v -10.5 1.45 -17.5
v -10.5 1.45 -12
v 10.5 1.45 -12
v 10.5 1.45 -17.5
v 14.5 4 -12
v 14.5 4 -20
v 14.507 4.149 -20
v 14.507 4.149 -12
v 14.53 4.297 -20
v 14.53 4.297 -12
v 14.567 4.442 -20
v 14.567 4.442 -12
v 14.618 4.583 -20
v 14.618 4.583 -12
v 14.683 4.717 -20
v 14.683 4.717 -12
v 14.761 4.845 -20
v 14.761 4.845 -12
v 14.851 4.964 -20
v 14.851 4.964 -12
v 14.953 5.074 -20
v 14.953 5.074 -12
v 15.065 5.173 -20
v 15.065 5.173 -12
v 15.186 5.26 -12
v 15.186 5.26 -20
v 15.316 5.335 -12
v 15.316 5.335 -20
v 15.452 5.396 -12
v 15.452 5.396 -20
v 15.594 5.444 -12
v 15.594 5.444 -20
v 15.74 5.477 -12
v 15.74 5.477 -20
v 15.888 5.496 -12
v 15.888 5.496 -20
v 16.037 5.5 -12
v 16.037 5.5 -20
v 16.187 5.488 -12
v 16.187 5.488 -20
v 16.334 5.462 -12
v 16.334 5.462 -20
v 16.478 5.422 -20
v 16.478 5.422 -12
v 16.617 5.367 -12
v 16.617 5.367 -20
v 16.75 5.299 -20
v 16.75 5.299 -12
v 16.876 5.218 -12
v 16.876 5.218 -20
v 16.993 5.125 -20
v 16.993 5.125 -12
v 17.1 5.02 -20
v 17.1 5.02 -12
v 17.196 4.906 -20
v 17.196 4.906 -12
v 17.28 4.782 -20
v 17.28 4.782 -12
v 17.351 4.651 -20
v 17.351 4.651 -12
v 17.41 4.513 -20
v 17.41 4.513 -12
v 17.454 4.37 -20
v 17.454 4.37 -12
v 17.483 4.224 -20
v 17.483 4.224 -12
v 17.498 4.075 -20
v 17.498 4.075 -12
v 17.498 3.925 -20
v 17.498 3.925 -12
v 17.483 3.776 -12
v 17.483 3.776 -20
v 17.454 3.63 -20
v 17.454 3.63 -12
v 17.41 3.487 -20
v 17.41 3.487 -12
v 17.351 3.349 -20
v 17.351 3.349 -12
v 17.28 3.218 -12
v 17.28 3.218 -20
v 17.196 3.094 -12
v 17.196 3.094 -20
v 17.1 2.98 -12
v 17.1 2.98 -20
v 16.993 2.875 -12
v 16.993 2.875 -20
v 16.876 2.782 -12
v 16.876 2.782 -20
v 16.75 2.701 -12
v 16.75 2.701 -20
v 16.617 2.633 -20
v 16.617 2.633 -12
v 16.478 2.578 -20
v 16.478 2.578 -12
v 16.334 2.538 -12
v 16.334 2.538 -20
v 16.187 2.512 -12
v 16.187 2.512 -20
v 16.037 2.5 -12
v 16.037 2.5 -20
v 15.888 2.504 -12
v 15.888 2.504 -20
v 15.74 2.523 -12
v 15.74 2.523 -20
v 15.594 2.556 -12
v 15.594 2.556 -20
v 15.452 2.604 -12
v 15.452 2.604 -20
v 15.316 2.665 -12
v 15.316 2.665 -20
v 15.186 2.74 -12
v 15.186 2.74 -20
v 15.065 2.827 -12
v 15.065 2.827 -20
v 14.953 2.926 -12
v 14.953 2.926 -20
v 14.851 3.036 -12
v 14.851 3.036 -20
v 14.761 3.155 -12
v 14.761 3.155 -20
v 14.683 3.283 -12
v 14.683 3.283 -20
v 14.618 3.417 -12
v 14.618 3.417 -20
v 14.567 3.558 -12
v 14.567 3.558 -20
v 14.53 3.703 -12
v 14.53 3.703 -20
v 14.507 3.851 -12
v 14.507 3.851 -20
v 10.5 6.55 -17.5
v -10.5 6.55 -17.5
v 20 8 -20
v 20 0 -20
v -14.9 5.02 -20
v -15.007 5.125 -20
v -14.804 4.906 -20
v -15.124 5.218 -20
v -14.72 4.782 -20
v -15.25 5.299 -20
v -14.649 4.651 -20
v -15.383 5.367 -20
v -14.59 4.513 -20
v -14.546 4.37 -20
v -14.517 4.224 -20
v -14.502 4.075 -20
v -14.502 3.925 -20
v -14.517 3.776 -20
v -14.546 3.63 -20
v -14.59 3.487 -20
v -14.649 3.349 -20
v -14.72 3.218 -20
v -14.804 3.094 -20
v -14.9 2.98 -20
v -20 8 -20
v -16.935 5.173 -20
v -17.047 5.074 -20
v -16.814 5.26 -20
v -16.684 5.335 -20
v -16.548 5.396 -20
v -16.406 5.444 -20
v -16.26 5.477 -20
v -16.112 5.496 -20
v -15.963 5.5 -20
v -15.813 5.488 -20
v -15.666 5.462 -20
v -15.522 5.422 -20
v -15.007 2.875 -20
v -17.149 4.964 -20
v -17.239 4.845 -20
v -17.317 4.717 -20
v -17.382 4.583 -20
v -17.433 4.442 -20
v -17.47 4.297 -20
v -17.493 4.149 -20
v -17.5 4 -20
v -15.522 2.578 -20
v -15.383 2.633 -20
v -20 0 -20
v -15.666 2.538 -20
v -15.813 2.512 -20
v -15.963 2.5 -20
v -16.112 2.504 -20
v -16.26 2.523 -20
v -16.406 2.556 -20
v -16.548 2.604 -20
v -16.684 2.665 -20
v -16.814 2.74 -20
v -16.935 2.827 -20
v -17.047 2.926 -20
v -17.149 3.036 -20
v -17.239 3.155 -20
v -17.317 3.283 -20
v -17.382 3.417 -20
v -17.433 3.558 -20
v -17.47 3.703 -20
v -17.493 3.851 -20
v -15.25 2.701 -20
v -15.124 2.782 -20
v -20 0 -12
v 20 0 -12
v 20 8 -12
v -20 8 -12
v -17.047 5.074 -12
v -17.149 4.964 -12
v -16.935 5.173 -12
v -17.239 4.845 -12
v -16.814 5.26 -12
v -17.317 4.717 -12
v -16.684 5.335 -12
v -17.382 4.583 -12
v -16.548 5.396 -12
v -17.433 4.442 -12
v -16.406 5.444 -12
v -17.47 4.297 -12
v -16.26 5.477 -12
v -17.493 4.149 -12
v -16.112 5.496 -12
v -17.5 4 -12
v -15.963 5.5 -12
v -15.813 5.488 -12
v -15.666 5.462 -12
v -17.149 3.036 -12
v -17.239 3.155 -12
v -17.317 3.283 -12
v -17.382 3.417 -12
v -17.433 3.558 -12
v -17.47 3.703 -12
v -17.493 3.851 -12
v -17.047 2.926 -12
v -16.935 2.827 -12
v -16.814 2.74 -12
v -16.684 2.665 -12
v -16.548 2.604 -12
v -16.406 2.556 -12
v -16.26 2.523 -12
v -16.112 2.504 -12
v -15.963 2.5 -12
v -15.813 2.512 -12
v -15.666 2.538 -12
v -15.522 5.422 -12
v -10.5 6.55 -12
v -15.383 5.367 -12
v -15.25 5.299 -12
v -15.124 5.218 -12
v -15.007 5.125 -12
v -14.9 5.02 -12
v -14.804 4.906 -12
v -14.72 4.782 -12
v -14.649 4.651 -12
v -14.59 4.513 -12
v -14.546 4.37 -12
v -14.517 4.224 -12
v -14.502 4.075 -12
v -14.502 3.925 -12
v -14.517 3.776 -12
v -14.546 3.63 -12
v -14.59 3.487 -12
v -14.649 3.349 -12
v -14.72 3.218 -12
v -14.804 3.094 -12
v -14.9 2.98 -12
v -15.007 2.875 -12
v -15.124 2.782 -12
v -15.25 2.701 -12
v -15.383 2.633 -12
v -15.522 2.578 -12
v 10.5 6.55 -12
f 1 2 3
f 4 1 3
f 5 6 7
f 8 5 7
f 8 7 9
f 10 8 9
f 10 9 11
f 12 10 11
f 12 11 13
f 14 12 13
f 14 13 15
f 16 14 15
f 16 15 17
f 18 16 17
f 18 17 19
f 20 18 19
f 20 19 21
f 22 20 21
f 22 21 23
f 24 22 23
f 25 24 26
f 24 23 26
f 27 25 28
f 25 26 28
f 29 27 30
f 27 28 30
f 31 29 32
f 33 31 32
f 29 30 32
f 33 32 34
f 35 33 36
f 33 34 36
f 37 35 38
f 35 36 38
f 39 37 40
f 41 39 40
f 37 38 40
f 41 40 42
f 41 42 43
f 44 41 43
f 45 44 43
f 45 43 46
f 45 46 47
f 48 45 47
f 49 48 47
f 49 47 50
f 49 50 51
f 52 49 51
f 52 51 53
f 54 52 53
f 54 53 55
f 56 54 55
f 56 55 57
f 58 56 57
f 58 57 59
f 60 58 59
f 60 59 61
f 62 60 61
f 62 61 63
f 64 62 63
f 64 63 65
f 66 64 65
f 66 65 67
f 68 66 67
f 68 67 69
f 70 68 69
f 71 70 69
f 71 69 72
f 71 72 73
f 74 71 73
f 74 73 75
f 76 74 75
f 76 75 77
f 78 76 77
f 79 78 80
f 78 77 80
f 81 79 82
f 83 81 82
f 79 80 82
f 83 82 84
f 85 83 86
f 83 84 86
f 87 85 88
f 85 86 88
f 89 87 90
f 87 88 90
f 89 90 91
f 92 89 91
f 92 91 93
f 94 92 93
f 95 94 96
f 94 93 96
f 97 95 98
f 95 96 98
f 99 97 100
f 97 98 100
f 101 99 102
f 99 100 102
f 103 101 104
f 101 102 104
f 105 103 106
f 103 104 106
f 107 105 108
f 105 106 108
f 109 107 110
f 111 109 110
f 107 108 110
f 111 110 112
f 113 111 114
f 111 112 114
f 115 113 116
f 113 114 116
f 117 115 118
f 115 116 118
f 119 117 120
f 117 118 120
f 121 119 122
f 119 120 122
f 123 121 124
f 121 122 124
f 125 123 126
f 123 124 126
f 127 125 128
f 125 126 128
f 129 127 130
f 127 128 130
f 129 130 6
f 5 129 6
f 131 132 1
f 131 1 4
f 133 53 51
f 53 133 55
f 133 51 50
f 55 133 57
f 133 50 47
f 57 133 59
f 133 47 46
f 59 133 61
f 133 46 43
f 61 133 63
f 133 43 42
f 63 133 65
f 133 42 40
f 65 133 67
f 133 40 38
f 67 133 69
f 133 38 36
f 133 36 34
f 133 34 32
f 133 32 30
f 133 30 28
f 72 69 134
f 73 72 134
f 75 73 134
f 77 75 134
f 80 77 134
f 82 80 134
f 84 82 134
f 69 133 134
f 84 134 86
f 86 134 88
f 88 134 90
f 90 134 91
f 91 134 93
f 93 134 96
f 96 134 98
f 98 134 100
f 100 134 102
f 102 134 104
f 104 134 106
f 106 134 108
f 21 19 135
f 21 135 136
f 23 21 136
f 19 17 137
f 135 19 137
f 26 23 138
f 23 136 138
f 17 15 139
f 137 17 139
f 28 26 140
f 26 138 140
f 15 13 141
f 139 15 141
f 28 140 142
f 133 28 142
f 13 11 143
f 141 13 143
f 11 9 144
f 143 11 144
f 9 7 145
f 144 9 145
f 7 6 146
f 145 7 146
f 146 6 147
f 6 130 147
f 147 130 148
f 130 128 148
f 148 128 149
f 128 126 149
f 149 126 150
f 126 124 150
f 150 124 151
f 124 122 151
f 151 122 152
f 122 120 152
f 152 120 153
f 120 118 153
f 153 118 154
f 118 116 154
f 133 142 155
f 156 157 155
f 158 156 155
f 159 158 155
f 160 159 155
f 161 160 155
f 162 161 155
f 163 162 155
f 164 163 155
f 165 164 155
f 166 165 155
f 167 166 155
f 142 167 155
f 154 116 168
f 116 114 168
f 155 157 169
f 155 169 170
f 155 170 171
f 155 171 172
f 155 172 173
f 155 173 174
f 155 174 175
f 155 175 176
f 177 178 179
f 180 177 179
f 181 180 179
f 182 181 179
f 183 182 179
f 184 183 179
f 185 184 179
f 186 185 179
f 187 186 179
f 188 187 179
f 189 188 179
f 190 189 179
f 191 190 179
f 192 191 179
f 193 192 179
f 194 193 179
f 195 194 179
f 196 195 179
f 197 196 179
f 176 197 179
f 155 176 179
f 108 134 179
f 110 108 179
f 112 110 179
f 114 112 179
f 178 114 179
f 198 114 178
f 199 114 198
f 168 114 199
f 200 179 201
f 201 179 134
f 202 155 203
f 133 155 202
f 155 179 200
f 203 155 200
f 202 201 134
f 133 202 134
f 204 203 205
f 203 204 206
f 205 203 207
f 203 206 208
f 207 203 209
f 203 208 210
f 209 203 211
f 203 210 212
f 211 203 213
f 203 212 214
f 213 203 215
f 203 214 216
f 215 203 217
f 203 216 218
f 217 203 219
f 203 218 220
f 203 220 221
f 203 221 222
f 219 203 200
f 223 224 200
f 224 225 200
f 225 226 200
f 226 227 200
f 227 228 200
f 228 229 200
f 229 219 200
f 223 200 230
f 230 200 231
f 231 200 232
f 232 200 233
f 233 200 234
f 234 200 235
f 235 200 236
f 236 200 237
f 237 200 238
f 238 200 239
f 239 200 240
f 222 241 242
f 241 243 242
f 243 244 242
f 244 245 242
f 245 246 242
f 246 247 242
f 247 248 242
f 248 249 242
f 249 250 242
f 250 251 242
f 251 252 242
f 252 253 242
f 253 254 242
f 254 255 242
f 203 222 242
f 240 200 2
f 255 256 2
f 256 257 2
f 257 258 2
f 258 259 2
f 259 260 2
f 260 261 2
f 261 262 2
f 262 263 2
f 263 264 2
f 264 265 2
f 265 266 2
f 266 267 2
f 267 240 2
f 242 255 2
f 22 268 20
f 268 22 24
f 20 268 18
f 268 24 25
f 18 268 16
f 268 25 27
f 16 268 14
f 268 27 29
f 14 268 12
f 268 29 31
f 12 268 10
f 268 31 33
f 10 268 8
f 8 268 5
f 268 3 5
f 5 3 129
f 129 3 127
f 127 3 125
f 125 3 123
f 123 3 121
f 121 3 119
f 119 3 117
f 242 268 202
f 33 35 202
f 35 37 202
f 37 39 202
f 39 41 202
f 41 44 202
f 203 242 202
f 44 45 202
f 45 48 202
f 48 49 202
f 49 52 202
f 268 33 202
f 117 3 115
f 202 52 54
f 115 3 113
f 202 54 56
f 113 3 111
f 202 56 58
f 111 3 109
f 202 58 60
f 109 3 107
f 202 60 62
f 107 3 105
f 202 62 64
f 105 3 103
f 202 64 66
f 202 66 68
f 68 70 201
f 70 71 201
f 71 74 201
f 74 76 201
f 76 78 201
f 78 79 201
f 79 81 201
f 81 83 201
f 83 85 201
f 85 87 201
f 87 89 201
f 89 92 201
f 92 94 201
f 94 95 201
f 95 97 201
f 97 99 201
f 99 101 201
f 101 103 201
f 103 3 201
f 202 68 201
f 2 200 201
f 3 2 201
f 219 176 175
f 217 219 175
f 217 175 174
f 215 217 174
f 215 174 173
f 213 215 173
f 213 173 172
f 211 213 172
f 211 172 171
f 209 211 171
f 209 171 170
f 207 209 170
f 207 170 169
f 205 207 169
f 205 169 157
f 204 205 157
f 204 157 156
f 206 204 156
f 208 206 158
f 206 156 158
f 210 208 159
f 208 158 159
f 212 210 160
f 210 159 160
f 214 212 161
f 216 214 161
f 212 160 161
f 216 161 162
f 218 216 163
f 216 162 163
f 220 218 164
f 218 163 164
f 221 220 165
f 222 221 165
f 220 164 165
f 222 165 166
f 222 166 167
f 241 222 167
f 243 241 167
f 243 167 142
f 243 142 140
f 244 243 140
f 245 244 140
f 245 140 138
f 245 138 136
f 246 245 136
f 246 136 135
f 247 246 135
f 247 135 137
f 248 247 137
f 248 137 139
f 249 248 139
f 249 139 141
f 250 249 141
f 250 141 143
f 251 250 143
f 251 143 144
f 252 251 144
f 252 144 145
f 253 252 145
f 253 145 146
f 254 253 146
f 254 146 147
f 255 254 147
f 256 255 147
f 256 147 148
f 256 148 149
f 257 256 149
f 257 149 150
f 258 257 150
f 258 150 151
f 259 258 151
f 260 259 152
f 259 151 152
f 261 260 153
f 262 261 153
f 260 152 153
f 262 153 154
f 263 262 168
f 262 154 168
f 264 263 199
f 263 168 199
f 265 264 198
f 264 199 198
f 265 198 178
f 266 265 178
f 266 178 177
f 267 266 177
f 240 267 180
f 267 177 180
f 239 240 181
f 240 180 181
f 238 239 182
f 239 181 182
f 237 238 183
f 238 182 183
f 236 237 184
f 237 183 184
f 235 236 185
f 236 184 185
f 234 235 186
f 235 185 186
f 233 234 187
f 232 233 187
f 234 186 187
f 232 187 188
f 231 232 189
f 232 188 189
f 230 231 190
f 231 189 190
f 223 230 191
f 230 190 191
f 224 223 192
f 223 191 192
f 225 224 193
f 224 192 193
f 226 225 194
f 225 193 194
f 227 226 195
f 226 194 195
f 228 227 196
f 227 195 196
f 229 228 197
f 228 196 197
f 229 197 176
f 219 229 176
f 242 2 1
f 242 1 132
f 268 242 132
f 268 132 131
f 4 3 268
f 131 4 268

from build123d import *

# Parameters (mm, degrees)
SKETCH1_W           = 21
SKETCH1_H           = 5.5
BOSS_EXTRUDE1_DEPTH = 8
SKETCH2_W           = 21
SKETCH2_H           = 5.1
CUT_EXTRUDE1_DEPTH  = 5.5
SKETCH3_R           = 1.5
CUT_EXTRUDE2_DEPTH  = 10


with BuildPart() as part:
    # Sketch1 → Boss-Extrude1 (new body)
    with BuildSketch(Plane(origin=(0, 0, 0), x_dir=(1, 0, 0), z_dir=(0, 1, 0))):
        Polygon((-20, 20), (-20, 12), (-10.5, 12), (-10.5, 17.5), (10.5, 17.5), (10.5, 12), (20, 12), (20, 20), align=None)
        with Locations((0, 14.75)):
            Rectangle(SKETCH1_W, SKETCH1_H)
    extrude(amount=BOSS_EXTRUDE1_DEPTH)

    # Sketch2 → Cut-Extrude1 (cut)
    with BuildSketch(Plane.XY.offset(-12)):
        with Locations((0, 4)):
            Rectangle(SKETCH2_W, SKETCH2_H)
    extrude(amount=-CUT_EXTRUDE1_DEPTH, mode=Mode.SUBTRACT)

    # Sketch3 → Cut-Extrude2 (cut)
    with BuildSketch(Plane(origin=(0, 0, -20), x_dir=(-1, 0, 0), z_dir=(0, 0, -1))):
        with Locations((-16, 4)):
            Circle(SKETCH3_R)
        with Locations((16, 4)):
            Circle(SKETCH3_R)
    extrude(amount=-CUT_EXTRUDE2_DEPTH, mode=Mode.SUBTRACT)


solid = part.part
